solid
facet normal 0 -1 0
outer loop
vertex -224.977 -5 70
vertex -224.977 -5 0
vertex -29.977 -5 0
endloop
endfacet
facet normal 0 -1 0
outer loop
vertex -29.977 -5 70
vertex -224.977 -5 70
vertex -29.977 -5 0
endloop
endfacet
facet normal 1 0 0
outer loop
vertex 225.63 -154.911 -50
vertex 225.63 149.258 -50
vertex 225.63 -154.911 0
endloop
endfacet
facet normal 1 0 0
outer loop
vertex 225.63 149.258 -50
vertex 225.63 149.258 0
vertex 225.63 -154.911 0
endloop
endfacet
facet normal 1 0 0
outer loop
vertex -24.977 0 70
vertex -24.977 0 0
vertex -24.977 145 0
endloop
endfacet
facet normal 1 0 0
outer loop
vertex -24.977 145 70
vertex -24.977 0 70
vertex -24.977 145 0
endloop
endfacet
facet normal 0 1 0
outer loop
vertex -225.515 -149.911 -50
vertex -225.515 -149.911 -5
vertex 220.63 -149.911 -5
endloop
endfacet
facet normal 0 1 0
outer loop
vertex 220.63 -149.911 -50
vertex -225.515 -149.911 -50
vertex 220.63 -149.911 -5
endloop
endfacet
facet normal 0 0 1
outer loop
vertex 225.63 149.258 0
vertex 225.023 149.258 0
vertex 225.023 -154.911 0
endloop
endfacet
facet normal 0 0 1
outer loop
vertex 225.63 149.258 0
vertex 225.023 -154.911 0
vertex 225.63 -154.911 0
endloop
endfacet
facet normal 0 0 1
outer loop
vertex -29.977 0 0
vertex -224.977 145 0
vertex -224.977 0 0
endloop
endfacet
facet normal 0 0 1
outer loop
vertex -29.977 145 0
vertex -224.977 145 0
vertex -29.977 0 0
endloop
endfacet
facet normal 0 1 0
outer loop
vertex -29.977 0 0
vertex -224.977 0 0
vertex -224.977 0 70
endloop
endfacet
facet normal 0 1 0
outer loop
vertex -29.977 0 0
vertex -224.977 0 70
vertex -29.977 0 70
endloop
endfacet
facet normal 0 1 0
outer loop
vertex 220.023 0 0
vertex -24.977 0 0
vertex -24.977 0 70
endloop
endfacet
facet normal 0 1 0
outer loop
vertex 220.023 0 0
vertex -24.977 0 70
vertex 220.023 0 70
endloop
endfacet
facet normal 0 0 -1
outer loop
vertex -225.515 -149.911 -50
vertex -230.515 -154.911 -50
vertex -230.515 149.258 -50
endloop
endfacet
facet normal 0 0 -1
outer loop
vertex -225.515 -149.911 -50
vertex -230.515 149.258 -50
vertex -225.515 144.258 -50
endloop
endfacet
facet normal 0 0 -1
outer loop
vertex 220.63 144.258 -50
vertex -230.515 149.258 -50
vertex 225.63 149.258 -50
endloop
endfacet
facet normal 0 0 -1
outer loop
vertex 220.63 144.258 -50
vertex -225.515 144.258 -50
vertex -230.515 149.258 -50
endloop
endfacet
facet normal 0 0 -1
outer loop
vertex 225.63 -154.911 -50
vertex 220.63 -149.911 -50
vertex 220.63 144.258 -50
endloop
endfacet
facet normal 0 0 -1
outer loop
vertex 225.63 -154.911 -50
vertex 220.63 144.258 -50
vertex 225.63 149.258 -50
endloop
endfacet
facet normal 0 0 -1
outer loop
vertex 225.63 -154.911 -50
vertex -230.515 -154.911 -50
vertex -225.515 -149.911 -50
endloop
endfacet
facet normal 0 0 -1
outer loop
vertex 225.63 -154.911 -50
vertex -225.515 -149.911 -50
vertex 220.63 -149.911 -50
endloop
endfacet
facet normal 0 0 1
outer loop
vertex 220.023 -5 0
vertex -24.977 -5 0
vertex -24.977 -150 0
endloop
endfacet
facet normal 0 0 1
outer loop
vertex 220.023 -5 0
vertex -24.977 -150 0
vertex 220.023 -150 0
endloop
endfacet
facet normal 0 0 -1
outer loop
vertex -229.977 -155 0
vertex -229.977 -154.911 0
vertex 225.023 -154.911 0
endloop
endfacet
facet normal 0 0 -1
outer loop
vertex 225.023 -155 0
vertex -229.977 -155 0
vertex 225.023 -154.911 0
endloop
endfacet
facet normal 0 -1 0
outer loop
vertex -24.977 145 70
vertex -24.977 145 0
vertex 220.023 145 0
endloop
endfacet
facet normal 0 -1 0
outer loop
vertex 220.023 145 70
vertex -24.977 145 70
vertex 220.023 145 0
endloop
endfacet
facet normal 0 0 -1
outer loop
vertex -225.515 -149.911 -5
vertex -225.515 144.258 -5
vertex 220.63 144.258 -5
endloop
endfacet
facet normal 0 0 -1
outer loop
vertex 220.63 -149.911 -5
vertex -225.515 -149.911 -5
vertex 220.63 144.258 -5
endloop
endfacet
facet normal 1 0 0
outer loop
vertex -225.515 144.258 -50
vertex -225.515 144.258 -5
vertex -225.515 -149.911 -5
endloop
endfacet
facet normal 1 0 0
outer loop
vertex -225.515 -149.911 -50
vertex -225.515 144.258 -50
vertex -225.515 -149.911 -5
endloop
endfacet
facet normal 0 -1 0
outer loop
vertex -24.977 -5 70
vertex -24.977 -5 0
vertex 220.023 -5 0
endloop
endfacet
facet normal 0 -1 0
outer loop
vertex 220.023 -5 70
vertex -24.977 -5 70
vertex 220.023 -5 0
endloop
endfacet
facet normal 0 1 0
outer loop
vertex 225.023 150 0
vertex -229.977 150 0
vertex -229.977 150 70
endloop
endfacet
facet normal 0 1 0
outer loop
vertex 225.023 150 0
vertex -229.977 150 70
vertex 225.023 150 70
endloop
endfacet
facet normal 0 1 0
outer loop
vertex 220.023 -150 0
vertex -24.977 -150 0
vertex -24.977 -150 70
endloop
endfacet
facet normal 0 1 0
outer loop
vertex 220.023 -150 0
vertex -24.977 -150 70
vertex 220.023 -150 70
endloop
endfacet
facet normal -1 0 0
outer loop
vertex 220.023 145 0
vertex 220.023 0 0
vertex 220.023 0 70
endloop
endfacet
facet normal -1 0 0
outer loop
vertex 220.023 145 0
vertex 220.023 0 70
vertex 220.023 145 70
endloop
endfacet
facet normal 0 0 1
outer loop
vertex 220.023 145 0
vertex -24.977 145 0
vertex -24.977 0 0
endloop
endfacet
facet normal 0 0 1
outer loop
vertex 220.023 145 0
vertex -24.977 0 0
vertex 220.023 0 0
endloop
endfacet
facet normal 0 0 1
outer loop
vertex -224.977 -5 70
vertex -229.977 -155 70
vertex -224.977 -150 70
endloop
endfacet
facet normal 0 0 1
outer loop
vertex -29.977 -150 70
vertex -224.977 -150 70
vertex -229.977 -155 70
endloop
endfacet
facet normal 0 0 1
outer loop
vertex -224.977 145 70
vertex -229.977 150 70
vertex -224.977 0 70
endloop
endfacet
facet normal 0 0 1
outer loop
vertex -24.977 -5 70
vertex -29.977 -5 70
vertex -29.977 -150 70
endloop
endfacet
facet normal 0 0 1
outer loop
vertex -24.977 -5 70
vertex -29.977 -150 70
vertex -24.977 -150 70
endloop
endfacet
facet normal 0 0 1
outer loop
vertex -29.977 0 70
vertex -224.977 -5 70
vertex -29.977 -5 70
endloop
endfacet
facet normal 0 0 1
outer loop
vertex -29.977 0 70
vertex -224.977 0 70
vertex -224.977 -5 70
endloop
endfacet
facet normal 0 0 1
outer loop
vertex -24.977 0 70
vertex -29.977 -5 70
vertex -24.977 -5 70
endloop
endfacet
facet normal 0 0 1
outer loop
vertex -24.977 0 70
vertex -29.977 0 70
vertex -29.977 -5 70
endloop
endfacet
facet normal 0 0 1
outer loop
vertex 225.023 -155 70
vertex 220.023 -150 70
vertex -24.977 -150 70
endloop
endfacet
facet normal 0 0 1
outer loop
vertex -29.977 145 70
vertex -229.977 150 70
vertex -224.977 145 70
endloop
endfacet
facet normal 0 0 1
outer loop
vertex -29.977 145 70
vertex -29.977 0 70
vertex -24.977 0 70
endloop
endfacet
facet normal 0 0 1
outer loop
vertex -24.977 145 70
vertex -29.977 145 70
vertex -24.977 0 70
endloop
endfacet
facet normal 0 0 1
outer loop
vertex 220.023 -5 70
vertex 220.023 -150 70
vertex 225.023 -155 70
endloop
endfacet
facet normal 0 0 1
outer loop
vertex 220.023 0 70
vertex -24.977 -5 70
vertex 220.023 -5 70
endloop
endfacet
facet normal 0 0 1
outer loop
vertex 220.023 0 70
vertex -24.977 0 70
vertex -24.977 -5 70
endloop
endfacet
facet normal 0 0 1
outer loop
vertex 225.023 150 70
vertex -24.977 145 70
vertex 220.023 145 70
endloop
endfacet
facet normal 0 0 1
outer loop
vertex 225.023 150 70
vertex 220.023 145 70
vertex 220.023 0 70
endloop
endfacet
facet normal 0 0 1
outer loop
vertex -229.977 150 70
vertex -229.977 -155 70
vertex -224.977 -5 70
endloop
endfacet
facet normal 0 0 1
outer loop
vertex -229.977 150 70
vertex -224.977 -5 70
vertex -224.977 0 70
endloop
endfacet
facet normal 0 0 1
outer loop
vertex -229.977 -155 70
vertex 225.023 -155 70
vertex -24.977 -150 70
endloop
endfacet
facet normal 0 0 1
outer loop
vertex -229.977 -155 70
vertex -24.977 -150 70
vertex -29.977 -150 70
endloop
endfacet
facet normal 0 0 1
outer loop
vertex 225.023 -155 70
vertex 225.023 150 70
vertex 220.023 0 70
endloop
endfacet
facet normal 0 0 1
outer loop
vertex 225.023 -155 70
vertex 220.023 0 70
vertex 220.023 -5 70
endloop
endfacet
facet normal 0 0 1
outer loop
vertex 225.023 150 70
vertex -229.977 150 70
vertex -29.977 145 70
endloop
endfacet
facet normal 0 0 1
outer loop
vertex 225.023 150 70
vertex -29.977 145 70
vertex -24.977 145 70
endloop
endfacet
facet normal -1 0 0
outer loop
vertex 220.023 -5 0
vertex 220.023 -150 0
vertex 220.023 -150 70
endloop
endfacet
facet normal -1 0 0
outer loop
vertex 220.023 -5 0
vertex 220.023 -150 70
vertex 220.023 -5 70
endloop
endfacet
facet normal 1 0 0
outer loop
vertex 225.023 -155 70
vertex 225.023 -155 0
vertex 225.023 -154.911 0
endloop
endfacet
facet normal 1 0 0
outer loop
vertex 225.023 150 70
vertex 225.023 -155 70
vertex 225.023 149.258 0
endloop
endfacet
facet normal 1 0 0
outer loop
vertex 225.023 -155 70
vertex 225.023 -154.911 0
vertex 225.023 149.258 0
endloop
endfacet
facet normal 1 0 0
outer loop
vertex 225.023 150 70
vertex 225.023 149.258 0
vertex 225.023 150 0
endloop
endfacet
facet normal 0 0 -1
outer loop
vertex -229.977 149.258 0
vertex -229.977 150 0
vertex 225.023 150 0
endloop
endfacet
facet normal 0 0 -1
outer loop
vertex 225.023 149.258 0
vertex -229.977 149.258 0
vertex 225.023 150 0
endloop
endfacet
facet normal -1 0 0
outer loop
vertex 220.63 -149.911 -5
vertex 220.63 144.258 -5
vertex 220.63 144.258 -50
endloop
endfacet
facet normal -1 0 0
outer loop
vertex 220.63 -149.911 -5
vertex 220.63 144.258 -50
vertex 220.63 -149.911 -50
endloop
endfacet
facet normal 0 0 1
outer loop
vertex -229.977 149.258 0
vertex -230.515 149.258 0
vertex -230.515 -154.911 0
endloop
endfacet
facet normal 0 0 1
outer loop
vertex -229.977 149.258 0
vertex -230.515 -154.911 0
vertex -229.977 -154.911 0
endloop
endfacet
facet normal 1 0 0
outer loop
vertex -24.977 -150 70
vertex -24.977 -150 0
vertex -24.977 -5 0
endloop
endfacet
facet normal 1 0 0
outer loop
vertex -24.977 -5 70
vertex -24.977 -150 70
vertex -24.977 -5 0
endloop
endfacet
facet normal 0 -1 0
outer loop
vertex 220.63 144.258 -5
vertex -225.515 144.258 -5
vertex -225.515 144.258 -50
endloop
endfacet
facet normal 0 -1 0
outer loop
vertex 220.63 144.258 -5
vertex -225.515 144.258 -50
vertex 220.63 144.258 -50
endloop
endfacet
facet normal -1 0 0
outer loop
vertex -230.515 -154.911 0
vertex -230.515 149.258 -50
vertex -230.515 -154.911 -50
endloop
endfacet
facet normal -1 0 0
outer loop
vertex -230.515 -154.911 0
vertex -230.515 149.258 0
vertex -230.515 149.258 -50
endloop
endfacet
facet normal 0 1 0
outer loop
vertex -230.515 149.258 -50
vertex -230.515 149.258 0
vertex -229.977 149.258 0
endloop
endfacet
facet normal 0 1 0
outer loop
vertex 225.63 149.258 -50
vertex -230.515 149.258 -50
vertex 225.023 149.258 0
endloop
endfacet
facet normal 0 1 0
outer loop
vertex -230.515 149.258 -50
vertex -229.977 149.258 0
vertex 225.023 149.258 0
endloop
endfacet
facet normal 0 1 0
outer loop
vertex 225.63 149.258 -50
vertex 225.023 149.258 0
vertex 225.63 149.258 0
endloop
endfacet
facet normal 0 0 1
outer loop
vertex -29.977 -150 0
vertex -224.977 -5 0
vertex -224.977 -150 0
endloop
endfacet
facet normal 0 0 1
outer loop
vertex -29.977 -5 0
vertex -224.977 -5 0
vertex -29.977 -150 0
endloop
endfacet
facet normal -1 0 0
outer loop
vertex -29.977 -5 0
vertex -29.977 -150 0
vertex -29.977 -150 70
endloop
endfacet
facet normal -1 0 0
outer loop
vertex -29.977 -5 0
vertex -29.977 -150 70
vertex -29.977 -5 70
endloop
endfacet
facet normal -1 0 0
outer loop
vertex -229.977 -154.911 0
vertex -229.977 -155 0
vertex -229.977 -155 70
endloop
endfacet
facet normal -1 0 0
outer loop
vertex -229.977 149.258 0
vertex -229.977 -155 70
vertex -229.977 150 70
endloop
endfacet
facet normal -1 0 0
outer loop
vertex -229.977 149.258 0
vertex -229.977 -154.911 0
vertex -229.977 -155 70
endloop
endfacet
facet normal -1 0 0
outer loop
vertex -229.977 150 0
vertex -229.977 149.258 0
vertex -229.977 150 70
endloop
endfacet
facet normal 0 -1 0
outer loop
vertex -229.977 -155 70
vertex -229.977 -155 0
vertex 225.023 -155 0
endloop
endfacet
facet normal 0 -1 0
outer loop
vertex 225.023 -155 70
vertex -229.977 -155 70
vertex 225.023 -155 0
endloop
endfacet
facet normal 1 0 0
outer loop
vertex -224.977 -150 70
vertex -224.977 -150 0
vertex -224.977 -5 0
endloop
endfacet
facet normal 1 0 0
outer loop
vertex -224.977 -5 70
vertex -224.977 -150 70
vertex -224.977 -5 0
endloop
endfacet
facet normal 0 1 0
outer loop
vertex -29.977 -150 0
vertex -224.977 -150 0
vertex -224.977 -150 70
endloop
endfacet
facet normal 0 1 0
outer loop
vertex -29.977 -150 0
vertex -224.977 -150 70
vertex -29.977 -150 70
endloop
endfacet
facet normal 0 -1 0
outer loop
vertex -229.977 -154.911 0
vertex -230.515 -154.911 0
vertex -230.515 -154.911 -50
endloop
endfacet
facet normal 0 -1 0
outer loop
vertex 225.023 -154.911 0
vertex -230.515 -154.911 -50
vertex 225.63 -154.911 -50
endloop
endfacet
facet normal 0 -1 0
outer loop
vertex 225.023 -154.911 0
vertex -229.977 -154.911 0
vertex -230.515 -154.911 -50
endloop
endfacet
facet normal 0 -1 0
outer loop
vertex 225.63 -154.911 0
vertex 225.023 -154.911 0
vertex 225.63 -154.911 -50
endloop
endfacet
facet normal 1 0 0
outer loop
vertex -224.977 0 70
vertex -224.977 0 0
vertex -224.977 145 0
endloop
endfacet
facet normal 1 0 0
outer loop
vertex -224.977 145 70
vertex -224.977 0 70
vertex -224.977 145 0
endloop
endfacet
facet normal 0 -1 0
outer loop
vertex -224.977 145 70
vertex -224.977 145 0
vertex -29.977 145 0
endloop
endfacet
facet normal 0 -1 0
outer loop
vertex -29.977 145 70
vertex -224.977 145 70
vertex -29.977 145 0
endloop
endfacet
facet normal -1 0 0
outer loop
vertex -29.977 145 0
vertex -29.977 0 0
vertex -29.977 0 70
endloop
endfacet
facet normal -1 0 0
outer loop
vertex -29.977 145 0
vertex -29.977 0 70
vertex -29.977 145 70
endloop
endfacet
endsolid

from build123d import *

# Parameters (mm, degrees)
F0_W     = 455
F0_H     = 305
F0_W_2   = 195
F0_H_2   = 145
F0_W_3   = 245
F1_DEPTH = 70
F2_W     = 456.144392
F2_H     = 304.169386
F3_DEPTH = 5
F4_W     = 456.144392
F4_H     = 304.169386
F4_W_2   = 446.144392
F4_H_2   = 294.169386
F5_DEPTH = 45


with BuildPart() as f1:
    # F0 (on Top) → F1 (new body)
    with BuildSketch(Plane.XY):
        with Locations((-2.477493, -2.5)):
            Rectangle(F0_W, F0_H)
        with Locations((-127.477493, -77.5)):
            Rectangle(F0_W_2, F0_H_2, mode=Mode.SUBTRACT)
        with Locations((97.522507, -77.5)):
            Rectangle(F0_W_3, F0_H_2, mode=Mode.SUBTRACT)
        with Locations((-127.477493, 72.5)):
            Rectangle(F0_W_2, F0_H_2, mode=Mode.SUBTRACT)
        with Locations((97.522507, 72.5)):
            Rectangle(F0_W_3, F0_H_2, mode=Mode.SUBTRACT)
    extrude(amount=F1_DEPTH)

    # F2 (on face) → F3 (join)
    with BuildSketch(Plane.XY):
        with Locations((-2.442673, -2.826333)):
            Rectangle(F2_W, F2_H)
    extrude(amount=-F3_DEPTH)

    # F4 (on face) → F5 (join)
    with BuildSketch(Plane(origin=(0, 0, -5), x_dir=(1, 0, 0), z_dir=(0, 0, -1))):
        with Locations((-2.442673, 2.826333)):
            Rectangle(F4_W, F4_H)
        with Locations((-2.442673, 2.826333)):
            Rectangle(F4_W_2, F4_H_2, mode=Mode.SUBTRACT)
    extrude(amount=F5_DEPTH)


solid = f1.part
